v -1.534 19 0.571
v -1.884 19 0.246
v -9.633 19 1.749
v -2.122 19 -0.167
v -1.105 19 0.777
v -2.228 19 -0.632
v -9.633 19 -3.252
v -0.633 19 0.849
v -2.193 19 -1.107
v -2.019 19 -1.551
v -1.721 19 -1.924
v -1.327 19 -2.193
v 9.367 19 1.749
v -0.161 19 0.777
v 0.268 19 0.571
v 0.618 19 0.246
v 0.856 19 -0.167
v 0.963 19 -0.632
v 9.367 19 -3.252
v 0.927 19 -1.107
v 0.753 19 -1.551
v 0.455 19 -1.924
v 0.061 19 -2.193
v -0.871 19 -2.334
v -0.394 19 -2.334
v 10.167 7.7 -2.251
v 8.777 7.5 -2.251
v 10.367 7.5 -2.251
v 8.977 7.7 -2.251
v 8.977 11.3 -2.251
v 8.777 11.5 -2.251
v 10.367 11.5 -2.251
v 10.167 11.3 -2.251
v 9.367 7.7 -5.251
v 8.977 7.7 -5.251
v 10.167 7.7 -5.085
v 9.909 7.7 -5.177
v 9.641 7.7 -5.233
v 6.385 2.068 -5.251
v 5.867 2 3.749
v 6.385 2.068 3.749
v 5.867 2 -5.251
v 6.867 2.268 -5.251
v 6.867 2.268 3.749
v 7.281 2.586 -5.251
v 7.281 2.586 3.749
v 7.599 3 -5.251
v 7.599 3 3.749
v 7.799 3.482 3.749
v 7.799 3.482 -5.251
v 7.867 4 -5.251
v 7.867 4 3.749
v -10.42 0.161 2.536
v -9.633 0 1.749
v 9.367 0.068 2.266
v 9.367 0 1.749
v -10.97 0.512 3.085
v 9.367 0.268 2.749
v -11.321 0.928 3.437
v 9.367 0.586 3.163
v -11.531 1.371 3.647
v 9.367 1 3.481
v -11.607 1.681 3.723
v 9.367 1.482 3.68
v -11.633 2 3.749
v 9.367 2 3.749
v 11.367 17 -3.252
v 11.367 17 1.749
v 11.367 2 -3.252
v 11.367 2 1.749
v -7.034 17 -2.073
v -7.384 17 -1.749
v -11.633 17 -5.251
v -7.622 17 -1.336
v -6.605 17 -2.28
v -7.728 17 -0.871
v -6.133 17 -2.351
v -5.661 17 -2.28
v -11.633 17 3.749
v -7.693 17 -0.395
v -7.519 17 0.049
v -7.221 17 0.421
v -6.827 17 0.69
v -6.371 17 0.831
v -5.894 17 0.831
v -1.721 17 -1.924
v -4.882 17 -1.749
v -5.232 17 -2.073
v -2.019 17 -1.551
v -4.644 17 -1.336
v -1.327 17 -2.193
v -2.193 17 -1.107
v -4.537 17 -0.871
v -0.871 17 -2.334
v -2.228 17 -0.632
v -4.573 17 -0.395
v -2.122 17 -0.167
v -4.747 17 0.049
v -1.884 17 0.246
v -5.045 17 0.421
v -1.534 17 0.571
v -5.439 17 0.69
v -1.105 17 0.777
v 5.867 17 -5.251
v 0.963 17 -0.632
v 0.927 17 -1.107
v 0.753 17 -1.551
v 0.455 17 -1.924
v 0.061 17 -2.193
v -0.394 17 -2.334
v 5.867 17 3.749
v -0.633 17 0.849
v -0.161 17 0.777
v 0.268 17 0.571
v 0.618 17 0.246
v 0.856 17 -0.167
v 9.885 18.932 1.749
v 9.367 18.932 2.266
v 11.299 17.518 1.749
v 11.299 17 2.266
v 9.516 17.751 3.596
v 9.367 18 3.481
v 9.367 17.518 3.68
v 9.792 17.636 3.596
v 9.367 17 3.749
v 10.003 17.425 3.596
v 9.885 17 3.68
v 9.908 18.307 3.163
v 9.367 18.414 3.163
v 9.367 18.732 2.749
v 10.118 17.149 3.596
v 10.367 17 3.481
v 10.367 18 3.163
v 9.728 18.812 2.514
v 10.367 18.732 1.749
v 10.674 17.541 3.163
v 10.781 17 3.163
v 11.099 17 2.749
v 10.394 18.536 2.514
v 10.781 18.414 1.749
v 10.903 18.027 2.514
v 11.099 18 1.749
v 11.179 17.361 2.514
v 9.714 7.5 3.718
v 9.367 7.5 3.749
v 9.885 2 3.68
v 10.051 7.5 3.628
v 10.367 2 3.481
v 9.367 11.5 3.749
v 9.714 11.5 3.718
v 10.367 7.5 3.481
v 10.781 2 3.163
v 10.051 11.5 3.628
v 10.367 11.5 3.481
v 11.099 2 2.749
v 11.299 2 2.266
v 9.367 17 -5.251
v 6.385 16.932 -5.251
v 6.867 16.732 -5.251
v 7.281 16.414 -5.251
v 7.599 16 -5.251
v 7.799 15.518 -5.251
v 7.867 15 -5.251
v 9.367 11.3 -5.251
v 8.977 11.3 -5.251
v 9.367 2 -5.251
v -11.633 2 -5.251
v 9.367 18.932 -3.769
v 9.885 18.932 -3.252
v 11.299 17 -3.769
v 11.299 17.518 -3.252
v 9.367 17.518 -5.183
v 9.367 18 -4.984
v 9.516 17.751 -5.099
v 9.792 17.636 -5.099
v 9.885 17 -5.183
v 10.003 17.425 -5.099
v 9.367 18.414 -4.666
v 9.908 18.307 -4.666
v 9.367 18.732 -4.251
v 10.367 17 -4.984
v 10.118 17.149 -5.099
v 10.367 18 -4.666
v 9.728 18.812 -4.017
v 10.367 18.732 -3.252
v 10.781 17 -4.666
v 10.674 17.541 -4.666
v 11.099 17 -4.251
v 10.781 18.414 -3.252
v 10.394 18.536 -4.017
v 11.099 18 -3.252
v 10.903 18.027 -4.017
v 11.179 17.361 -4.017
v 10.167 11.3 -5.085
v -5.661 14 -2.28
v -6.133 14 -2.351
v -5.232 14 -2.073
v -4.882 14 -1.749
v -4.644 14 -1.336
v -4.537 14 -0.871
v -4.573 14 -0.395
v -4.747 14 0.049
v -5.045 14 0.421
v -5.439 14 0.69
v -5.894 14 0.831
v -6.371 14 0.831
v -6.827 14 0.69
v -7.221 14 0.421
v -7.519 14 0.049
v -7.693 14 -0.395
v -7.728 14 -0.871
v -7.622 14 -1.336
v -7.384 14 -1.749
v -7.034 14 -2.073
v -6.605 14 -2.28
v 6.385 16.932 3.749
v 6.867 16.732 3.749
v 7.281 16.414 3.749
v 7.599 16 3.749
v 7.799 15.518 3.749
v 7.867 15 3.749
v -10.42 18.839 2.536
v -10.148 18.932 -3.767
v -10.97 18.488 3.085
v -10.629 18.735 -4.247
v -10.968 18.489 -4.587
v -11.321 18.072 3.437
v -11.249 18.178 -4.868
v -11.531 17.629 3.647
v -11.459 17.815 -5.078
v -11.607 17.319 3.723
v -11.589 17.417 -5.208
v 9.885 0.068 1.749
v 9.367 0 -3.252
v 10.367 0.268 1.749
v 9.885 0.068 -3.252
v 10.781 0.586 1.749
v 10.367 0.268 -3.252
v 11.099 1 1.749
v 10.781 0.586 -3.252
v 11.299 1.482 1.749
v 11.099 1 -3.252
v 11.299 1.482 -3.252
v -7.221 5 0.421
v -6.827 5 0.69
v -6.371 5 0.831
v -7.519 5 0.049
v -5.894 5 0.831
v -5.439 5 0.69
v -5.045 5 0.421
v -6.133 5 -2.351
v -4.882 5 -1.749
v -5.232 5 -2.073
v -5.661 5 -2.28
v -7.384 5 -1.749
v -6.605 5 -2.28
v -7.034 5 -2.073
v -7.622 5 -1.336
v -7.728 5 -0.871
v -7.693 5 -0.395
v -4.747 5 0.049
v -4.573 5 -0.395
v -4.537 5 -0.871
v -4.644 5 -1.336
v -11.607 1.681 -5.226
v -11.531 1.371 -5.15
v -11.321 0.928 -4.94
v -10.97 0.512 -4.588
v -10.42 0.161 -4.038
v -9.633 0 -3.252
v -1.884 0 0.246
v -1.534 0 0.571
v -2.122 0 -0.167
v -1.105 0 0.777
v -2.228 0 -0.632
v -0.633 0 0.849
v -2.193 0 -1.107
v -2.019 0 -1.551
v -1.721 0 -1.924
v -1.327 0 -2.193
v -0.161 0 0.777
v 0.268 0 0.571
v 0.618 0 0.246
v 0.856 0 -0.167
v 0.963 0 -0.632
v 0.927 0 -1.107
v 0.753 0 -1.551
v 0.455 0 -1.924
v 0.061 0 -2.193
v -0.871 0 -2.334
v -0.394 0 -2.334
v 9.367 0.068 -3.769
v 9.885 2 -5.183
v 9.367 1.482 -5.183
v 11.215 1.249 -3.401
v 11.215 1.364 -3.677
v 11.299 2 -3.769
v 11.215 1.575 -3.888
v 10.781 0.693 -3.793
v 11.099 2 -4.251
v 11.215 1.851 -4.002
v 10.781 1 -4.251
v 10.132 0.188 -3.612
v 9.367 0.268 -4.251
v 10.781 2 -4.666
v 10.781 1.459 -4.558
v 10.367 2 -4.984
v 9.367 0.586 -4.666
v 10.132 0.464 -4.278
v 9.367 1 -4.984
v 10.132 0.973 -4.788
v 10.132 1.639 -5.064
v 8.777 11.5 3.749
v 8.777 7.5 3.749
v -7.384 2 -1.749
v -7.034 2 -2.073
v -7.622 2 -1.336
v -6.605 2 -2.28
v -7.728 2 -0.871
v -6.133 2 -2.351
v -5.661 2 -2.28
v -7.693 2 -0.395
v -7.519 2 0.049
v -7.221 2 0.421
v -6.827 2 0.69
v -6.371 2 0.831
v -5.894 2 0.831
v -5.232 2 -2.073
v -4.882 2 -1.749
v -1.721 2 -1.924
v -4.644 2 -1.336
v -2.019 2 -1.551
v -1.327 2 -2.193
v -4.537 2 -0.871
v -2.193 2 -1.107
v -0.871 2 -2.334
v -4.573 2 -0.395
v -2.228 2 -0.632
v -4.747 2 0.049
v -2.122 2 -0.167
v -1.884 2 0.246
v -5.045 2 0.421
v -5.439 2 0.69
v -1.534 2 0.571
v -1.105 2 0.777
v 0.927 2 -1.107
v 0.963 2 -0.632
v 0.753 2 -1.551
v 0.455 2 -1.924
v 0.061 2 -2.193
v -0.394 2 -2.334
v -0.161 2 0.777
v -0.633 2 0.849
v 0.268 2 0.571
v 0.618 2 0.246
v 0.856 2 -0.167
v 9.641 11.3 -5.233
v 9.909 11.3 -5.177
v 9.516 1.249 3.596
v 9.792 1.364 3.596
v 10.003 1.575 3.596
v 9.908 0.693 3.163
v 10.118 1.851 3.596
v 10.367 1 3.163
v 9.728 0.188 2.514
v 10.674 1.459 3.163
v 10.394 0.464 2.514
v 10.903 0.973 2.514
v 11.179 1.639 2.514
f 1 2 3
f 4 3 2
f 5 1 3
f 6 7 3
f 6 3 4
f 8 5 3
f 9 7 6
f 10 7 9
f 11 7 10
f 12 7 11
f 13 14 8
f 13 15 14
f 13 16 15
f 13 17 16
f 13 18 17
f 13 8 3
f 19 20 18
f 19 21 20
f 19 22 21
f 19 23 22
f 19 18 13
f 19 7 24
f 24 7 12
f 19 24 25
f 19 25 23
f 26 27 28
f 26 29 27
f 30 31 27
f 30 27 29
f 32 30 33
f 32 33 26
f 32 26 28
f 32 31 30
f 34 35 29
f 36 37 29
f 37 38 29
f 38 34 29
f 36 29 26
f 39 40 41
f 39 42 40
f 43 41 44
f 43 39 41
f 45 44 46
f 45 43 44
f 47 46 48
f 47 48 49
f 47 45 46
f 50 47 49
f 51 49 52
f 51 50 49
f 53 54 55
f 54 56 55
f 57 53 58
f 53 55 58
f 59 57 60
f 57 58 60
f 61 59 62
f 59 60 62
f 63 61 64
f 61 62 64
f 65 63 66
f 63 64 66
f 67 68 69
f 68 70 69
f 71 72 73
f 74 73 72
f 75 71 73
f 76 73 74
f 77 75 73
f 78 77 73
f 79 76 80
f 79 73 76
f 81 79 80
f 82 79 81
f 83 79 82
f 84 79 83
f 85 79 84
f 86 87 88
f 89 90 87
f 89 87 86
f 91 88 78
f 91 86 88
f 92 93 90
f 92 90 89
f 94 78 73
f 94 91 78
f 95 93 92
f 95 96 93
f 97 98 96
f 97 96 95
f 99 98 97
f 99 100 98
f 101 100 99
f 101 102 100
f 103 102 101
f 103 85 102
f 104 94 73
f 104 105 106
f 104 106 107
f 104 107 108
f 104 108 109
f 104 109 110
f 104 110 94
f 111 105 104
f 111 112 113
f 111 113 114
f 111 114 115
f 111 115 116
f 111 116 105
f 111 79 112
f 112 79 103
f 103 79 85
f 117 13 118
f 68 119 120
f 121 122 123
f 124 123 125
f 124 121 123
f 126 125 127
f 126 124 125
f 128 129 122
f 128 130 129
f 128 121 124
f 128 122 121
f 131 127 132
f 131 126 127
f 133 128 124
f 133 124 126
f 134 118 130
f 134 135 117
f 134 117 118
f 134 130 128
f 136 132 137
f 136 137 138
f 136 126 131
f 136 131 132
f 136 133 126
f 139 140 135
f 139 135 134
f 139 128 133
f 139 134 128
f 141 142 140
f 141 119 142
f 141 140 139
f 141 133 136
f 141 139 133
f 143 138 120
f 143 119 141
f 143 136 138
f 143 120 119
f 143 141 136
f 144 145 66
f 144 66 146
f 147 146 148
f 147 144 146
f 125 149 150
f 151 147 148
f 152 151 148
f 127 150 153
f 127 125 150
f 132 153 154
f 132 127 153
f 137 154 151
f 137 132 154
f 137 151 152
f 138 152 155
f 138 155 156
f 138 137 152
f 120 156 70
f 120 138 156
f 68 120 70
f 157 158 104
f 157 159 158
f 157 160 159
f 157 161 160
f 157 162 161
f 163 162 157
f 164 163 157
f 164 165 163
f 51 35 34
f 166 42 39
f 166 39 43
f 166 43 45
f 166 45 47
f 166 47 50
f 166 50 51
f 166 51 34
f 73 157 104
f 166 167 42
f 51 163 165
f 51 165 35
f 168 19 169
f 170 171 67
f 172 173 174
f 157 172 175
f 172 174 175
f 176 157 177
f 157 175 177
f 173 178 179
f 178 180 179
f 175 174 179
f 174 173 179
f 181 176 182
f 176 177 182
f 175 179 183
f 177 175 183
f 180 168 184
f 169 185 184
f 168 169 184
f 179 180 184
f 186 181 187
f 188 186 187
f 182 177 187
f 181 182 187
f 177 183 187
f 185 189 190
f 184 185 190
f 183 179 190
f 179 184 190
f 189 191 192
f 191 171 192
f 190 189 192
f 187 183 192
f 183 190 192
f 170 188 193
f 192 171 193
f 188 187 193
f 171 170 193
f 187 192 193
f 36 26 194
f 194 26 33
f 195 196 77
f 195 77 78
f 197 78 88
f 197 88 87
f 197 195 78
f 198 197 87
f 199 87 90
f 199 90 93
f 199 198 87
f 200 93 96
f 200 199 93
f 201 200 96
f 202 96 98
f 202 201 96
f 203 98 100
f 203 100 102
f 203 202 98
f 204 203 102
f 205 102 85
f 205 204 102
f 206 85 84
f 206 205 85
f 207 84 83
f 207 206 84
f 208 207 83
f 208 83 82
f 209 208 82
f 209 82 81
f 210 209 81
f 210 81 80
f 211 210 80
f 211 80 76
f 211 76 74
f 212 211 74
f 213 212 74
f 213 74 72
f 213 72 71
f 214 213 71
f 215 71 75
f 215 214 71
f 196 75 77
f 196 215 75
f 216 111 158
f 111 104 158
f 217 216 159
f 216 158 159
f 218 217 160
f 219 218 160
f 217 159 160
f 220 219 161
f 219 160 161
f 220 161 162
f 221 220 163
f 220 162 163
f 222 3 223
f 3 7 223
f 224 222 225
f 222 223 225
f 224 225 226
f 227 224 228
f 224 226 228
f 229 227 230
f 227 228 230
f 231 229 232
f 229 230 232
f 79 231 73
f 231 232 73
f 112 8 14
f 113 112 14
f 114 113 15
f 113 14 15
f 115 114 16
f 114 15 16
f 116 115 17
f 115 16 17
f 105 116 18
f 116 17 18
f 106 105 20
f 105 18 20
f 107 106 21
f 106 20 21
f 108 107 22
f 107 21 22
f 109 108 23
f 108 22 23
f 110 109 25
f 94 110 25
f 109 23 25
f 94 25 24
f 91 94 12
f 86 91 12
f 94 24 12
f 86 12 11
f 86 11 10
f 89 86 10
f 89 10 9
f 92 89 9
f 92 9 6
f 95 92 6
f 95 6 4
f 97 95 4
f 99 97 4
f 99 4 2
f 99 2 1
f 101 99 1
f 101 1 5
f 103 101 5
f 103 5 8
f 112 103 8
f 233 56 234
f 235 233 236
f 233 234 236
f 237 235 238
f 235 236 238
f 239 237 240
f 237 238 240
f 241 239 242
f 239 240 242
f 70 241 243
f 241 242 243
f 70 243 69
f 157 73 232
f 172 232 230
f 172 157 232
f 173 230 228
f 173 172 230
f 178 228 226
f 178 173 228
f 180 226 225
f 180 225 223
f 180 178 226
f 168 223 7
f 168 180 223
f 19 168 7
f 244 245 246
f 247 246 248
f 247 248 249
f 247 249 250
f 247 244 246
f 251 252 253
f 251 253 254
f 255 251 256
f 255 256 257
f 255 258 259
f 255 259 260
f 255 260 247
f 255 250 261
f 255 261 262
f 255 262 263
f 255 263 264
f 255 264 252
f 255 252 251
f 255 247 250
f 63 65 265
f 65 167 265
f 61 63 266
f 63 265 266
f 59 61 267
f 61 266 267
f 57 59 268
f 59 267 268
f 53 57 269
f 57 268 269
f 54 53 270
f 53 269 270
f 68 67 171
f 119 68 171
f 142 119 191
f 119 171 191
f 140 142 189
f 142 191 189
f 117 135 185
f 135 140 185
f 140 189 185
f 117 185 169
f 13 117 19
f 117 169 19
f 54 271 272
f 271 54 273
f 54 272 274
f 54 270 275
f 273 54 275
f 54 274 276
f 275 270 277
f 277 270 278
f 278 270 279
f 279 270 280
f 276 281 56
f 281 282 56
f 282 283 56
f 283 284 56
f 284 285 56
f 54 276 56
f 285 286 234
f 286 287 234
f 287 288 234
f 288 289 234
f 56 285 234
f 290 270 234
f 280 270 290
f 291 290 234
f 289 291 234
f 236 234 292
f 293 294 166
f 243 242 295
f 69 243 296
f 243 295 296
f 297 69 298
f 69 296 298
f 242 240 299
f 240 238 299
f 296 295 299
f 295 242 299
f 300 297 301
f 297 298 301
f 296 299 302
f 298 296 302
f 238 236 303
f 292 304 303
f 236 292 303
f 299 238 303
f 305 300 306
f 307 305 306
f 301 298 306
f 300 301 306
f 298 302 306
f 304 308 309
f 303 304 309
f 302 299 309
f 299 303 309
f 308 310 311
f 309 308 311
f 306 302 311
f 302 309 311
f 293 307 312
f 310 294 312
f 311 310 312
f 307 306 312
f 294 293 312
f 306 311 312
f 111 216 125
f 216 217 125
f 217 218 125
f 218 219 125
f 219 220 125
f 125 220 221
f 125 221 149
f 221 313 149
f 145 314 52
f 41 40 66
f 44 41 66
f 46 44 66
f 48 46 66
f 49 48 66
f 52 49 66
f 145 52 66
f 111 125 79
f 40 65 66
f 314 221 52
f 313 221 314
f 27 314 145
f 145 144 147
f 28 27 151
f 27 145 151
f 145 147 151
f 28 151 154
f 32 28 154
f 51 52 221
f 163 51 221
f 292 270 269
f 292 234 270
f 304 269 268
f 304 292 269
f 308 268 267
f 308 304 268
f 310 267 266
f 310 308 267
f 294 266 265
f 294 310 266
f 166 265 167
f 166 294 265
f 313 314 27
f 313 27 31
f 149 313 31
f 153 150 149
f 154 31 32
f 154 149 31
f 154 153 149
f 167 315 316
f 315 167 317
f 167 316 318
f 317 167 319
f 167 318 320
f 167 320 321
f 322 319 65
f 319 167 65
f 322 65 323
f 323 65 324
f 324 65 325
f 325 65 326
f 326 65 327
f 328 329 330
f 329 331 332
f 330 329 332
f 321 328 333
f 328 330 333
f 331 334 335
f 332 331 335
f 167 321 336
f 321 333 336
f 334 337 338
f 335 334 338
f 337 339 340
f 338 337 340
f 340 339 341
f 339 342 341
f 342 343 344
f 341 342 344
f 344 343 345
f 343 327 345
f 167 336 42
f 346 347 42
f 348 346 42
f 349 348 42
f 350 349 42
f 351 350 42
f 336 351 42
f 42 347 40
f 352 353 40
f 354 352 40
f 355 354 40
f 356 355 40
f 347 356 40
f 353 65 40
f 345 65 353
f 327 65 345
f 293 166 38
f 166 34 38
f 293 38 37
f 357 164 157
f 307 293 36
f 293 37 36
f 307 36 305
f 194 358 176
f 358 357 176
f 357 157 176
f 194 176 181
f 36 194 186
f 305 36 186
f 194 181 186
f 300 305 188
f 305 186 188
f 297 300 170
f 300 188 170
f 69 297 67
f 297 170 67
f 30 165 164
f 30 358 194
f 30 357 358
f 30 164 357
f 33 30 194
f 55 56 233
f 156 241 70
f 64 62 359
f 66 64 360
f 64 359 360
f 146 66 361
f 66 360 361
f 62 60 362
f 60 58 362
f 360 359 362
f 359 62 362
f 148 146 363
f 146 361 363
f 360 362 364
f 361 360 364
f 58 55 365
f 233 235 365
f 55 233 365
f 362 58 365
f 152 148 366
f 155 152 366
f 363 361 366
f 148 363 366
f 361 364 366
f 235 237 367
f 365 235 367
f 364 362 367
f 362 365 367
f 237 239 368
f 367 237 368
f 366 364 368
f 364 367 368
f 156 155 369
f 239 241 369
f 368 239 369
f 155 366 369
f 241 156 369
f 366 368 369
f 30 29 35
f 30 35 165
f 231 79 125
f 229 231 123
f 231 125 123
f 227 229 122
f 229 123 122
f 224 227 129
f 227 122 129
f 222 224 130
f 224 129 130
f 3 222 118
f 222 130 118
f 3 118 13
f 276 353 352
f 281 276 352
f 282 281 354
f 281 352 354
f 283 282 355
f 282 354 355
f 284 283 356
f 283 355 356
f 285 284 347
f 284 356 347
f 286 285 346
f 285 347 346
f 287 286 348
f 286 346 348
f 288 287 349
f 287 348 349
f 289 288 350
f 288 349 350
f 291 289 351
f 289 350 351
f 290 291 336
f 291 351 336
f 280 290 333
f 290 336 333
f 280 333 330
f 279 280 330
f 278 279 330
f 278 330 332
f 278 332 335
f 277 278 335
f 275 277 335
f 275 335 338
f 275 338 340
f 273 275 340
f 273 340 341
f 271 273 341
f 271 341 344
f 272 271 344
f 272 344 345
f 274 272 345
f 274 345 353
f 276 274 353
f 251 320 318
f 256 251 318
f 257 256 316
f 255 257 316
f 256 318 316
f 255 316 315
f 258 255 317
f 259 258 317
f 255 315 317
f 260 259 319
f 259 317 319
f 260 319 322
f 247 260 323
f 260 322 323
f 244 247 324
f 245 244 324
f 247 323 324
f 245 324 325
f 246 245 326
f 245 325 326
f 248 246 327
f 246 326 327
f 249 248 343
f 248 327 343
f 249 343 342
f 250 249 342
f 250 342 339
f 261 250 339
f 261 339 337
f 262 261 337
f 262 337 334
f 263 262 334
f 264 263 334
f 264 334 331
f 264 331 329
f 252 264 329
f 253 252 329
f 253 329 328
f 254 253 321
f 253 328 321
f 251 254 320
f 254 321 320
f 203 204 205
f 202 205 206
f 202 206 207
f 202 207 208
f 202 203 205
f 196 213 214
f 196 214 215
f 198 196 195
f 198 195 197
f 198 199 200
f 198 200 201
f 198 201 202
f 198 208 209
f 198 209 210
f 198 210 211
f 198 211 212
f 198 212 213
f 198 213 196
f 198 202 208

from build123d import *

# Parameters (mm, degrees)
SKETCH1_W      = 23
SKETCH1_H      = 9
EXTRUDE1_DEPTH = 19
SKETCH2_R      = 1.6
EXTRUDE2_DEPTH = 23.888930821
SKETCH3_W      = 19.5
SKETCH3_H      = 15
EXTRUDE3_DEPTH = 25.02759827
SKETCH6_R      = 1.6
EXTRUDE4_DEPTH = 3
EXTRUDE5_START = 3
SKETCH7_R      = 1.6
EXTRUDE5_DEPTH = 3
FILLET1_R      = 2
SKETCH8_W      = 1.59
SKETCH8_H      = 4
EXTRUDE6_DEPTH = 6
SKETCH9_W      = 1.19
SKETCH9_H      = 3.6
EXTRUDE7_DEPTH = 24.072179755


with BuildPart() as part:
    # Sketch1 → Extrude1 (new body)
    with BuildSketch(Plane(origin=(0, 0, 0), x_dir=(1, 0, 0), z_dir=(0, 1, 0))):
        with Locations((-0.132947977, 0.751445087)):
            Rectangle(SKETCH1_W, SKETCH1_H)
    extrude(amount=EXTRUDE1_DEPTH)

    # Sketch2 → Extrude2 (cut, through all)
    with BuildSketch(Plane(origin=(0, 19, 0), x_dir=(1, 0, 0), z_dir=(0, 1, 0))):
        with Locations(Location((-0.632947977, 0.751445087, 0), (0, 0, 270))):
            Circle(SKETCH2_R)
    extrude(amount=-EXTRUDE2_DEPTH, mode=Mode.SUBTRACT)

    # Sketch3 → Extrude3 (cut, through all)
    with BuildSketch(Plane.XY.offset(3.748554913)):
        with Locations((-1.882947977, 9.5)):
            Rectangle(SKETCH3_W, SKETCH3_H)
    extrude(amount=-EXTRUDE3_DEPTH, mode=Mode.SUBTRACT)

    # Sketch6 → Extrude4 (add)
    with BuildSketch(Plane(origin=(0, 2, 0), x_dir=(1, 0, 0), z_dir=(0, 1, 0))):
        with Locations(Location((-6.132947977, 0.751445087, 0), (0, 0, 90))):
            Circle(SKETCH6_R)
    extrude(amount=EXTRUDE4_DEPTH)

    # Sketch7 → Extrude5 (add)
    with BuildSketch(Plane.XZ.offset(-17).offset(EXTRUDE5_START)):
        with Locations(Location((-6.132947977, -0.751445087, 0), (0, 0, 270))):
            Circle(SKETCH7_R)
    extrude(amount=-EXTRUDE5_DEPTH)

    # Fillet1
    fillet1_edges = [part.edges().sort_by_distance(p)[0] for p in [
        (11.367052023, 19, -0.751445087),
        (-0.132947977, 19, -5.251445087),
        (7.867052023, 2, -0.751445087),
        (7.867052023, 17, -0.751445087),
        (-11.632947977, 19, -0.751445087),
        (-0.132947977, 0, -5.251445087),
        (11.367052023, 0, -0.751445087),
        (-0.132947977, 0, 3.748554913),
        (-11.632947977, 0, -0.751445087),
        (-0.132947977, 19, 3.748554913),
        (11.367052023, 9.5, -5.251445087),
        (11.367052023, 9.5, 3.748554913),
    ]]
    fillet(fillet1_edges, radius=FILLET1_R - 0.0001)  # a hair under: the kernel refuses the full size

    # Sketch8 → Extrude6 (cut)
    with BuildSketch(Plane.XY.offset(3.748554913)):
        with Locations((9.572052023, 9.5)):
            Rectangle(SKETCH8_W, SKETCH8_H)
    extrude(amount=-EXTRUDE6_DEPTH, mode=Mode.SUBTRACT)

    # Sketch9 → Extrude7 (cut, through all)
    with BuildSketch(Plane.XY.offset(-2.251445087)):
        with Locations((9.572052023, 9.5)):
            Rectangle(SKETCH9_W, SKETCH9_H)
    extrude(amount=-EXTRUDE7_DEPTH, mode=Mode.SUBTRACT)


solid = part.part
